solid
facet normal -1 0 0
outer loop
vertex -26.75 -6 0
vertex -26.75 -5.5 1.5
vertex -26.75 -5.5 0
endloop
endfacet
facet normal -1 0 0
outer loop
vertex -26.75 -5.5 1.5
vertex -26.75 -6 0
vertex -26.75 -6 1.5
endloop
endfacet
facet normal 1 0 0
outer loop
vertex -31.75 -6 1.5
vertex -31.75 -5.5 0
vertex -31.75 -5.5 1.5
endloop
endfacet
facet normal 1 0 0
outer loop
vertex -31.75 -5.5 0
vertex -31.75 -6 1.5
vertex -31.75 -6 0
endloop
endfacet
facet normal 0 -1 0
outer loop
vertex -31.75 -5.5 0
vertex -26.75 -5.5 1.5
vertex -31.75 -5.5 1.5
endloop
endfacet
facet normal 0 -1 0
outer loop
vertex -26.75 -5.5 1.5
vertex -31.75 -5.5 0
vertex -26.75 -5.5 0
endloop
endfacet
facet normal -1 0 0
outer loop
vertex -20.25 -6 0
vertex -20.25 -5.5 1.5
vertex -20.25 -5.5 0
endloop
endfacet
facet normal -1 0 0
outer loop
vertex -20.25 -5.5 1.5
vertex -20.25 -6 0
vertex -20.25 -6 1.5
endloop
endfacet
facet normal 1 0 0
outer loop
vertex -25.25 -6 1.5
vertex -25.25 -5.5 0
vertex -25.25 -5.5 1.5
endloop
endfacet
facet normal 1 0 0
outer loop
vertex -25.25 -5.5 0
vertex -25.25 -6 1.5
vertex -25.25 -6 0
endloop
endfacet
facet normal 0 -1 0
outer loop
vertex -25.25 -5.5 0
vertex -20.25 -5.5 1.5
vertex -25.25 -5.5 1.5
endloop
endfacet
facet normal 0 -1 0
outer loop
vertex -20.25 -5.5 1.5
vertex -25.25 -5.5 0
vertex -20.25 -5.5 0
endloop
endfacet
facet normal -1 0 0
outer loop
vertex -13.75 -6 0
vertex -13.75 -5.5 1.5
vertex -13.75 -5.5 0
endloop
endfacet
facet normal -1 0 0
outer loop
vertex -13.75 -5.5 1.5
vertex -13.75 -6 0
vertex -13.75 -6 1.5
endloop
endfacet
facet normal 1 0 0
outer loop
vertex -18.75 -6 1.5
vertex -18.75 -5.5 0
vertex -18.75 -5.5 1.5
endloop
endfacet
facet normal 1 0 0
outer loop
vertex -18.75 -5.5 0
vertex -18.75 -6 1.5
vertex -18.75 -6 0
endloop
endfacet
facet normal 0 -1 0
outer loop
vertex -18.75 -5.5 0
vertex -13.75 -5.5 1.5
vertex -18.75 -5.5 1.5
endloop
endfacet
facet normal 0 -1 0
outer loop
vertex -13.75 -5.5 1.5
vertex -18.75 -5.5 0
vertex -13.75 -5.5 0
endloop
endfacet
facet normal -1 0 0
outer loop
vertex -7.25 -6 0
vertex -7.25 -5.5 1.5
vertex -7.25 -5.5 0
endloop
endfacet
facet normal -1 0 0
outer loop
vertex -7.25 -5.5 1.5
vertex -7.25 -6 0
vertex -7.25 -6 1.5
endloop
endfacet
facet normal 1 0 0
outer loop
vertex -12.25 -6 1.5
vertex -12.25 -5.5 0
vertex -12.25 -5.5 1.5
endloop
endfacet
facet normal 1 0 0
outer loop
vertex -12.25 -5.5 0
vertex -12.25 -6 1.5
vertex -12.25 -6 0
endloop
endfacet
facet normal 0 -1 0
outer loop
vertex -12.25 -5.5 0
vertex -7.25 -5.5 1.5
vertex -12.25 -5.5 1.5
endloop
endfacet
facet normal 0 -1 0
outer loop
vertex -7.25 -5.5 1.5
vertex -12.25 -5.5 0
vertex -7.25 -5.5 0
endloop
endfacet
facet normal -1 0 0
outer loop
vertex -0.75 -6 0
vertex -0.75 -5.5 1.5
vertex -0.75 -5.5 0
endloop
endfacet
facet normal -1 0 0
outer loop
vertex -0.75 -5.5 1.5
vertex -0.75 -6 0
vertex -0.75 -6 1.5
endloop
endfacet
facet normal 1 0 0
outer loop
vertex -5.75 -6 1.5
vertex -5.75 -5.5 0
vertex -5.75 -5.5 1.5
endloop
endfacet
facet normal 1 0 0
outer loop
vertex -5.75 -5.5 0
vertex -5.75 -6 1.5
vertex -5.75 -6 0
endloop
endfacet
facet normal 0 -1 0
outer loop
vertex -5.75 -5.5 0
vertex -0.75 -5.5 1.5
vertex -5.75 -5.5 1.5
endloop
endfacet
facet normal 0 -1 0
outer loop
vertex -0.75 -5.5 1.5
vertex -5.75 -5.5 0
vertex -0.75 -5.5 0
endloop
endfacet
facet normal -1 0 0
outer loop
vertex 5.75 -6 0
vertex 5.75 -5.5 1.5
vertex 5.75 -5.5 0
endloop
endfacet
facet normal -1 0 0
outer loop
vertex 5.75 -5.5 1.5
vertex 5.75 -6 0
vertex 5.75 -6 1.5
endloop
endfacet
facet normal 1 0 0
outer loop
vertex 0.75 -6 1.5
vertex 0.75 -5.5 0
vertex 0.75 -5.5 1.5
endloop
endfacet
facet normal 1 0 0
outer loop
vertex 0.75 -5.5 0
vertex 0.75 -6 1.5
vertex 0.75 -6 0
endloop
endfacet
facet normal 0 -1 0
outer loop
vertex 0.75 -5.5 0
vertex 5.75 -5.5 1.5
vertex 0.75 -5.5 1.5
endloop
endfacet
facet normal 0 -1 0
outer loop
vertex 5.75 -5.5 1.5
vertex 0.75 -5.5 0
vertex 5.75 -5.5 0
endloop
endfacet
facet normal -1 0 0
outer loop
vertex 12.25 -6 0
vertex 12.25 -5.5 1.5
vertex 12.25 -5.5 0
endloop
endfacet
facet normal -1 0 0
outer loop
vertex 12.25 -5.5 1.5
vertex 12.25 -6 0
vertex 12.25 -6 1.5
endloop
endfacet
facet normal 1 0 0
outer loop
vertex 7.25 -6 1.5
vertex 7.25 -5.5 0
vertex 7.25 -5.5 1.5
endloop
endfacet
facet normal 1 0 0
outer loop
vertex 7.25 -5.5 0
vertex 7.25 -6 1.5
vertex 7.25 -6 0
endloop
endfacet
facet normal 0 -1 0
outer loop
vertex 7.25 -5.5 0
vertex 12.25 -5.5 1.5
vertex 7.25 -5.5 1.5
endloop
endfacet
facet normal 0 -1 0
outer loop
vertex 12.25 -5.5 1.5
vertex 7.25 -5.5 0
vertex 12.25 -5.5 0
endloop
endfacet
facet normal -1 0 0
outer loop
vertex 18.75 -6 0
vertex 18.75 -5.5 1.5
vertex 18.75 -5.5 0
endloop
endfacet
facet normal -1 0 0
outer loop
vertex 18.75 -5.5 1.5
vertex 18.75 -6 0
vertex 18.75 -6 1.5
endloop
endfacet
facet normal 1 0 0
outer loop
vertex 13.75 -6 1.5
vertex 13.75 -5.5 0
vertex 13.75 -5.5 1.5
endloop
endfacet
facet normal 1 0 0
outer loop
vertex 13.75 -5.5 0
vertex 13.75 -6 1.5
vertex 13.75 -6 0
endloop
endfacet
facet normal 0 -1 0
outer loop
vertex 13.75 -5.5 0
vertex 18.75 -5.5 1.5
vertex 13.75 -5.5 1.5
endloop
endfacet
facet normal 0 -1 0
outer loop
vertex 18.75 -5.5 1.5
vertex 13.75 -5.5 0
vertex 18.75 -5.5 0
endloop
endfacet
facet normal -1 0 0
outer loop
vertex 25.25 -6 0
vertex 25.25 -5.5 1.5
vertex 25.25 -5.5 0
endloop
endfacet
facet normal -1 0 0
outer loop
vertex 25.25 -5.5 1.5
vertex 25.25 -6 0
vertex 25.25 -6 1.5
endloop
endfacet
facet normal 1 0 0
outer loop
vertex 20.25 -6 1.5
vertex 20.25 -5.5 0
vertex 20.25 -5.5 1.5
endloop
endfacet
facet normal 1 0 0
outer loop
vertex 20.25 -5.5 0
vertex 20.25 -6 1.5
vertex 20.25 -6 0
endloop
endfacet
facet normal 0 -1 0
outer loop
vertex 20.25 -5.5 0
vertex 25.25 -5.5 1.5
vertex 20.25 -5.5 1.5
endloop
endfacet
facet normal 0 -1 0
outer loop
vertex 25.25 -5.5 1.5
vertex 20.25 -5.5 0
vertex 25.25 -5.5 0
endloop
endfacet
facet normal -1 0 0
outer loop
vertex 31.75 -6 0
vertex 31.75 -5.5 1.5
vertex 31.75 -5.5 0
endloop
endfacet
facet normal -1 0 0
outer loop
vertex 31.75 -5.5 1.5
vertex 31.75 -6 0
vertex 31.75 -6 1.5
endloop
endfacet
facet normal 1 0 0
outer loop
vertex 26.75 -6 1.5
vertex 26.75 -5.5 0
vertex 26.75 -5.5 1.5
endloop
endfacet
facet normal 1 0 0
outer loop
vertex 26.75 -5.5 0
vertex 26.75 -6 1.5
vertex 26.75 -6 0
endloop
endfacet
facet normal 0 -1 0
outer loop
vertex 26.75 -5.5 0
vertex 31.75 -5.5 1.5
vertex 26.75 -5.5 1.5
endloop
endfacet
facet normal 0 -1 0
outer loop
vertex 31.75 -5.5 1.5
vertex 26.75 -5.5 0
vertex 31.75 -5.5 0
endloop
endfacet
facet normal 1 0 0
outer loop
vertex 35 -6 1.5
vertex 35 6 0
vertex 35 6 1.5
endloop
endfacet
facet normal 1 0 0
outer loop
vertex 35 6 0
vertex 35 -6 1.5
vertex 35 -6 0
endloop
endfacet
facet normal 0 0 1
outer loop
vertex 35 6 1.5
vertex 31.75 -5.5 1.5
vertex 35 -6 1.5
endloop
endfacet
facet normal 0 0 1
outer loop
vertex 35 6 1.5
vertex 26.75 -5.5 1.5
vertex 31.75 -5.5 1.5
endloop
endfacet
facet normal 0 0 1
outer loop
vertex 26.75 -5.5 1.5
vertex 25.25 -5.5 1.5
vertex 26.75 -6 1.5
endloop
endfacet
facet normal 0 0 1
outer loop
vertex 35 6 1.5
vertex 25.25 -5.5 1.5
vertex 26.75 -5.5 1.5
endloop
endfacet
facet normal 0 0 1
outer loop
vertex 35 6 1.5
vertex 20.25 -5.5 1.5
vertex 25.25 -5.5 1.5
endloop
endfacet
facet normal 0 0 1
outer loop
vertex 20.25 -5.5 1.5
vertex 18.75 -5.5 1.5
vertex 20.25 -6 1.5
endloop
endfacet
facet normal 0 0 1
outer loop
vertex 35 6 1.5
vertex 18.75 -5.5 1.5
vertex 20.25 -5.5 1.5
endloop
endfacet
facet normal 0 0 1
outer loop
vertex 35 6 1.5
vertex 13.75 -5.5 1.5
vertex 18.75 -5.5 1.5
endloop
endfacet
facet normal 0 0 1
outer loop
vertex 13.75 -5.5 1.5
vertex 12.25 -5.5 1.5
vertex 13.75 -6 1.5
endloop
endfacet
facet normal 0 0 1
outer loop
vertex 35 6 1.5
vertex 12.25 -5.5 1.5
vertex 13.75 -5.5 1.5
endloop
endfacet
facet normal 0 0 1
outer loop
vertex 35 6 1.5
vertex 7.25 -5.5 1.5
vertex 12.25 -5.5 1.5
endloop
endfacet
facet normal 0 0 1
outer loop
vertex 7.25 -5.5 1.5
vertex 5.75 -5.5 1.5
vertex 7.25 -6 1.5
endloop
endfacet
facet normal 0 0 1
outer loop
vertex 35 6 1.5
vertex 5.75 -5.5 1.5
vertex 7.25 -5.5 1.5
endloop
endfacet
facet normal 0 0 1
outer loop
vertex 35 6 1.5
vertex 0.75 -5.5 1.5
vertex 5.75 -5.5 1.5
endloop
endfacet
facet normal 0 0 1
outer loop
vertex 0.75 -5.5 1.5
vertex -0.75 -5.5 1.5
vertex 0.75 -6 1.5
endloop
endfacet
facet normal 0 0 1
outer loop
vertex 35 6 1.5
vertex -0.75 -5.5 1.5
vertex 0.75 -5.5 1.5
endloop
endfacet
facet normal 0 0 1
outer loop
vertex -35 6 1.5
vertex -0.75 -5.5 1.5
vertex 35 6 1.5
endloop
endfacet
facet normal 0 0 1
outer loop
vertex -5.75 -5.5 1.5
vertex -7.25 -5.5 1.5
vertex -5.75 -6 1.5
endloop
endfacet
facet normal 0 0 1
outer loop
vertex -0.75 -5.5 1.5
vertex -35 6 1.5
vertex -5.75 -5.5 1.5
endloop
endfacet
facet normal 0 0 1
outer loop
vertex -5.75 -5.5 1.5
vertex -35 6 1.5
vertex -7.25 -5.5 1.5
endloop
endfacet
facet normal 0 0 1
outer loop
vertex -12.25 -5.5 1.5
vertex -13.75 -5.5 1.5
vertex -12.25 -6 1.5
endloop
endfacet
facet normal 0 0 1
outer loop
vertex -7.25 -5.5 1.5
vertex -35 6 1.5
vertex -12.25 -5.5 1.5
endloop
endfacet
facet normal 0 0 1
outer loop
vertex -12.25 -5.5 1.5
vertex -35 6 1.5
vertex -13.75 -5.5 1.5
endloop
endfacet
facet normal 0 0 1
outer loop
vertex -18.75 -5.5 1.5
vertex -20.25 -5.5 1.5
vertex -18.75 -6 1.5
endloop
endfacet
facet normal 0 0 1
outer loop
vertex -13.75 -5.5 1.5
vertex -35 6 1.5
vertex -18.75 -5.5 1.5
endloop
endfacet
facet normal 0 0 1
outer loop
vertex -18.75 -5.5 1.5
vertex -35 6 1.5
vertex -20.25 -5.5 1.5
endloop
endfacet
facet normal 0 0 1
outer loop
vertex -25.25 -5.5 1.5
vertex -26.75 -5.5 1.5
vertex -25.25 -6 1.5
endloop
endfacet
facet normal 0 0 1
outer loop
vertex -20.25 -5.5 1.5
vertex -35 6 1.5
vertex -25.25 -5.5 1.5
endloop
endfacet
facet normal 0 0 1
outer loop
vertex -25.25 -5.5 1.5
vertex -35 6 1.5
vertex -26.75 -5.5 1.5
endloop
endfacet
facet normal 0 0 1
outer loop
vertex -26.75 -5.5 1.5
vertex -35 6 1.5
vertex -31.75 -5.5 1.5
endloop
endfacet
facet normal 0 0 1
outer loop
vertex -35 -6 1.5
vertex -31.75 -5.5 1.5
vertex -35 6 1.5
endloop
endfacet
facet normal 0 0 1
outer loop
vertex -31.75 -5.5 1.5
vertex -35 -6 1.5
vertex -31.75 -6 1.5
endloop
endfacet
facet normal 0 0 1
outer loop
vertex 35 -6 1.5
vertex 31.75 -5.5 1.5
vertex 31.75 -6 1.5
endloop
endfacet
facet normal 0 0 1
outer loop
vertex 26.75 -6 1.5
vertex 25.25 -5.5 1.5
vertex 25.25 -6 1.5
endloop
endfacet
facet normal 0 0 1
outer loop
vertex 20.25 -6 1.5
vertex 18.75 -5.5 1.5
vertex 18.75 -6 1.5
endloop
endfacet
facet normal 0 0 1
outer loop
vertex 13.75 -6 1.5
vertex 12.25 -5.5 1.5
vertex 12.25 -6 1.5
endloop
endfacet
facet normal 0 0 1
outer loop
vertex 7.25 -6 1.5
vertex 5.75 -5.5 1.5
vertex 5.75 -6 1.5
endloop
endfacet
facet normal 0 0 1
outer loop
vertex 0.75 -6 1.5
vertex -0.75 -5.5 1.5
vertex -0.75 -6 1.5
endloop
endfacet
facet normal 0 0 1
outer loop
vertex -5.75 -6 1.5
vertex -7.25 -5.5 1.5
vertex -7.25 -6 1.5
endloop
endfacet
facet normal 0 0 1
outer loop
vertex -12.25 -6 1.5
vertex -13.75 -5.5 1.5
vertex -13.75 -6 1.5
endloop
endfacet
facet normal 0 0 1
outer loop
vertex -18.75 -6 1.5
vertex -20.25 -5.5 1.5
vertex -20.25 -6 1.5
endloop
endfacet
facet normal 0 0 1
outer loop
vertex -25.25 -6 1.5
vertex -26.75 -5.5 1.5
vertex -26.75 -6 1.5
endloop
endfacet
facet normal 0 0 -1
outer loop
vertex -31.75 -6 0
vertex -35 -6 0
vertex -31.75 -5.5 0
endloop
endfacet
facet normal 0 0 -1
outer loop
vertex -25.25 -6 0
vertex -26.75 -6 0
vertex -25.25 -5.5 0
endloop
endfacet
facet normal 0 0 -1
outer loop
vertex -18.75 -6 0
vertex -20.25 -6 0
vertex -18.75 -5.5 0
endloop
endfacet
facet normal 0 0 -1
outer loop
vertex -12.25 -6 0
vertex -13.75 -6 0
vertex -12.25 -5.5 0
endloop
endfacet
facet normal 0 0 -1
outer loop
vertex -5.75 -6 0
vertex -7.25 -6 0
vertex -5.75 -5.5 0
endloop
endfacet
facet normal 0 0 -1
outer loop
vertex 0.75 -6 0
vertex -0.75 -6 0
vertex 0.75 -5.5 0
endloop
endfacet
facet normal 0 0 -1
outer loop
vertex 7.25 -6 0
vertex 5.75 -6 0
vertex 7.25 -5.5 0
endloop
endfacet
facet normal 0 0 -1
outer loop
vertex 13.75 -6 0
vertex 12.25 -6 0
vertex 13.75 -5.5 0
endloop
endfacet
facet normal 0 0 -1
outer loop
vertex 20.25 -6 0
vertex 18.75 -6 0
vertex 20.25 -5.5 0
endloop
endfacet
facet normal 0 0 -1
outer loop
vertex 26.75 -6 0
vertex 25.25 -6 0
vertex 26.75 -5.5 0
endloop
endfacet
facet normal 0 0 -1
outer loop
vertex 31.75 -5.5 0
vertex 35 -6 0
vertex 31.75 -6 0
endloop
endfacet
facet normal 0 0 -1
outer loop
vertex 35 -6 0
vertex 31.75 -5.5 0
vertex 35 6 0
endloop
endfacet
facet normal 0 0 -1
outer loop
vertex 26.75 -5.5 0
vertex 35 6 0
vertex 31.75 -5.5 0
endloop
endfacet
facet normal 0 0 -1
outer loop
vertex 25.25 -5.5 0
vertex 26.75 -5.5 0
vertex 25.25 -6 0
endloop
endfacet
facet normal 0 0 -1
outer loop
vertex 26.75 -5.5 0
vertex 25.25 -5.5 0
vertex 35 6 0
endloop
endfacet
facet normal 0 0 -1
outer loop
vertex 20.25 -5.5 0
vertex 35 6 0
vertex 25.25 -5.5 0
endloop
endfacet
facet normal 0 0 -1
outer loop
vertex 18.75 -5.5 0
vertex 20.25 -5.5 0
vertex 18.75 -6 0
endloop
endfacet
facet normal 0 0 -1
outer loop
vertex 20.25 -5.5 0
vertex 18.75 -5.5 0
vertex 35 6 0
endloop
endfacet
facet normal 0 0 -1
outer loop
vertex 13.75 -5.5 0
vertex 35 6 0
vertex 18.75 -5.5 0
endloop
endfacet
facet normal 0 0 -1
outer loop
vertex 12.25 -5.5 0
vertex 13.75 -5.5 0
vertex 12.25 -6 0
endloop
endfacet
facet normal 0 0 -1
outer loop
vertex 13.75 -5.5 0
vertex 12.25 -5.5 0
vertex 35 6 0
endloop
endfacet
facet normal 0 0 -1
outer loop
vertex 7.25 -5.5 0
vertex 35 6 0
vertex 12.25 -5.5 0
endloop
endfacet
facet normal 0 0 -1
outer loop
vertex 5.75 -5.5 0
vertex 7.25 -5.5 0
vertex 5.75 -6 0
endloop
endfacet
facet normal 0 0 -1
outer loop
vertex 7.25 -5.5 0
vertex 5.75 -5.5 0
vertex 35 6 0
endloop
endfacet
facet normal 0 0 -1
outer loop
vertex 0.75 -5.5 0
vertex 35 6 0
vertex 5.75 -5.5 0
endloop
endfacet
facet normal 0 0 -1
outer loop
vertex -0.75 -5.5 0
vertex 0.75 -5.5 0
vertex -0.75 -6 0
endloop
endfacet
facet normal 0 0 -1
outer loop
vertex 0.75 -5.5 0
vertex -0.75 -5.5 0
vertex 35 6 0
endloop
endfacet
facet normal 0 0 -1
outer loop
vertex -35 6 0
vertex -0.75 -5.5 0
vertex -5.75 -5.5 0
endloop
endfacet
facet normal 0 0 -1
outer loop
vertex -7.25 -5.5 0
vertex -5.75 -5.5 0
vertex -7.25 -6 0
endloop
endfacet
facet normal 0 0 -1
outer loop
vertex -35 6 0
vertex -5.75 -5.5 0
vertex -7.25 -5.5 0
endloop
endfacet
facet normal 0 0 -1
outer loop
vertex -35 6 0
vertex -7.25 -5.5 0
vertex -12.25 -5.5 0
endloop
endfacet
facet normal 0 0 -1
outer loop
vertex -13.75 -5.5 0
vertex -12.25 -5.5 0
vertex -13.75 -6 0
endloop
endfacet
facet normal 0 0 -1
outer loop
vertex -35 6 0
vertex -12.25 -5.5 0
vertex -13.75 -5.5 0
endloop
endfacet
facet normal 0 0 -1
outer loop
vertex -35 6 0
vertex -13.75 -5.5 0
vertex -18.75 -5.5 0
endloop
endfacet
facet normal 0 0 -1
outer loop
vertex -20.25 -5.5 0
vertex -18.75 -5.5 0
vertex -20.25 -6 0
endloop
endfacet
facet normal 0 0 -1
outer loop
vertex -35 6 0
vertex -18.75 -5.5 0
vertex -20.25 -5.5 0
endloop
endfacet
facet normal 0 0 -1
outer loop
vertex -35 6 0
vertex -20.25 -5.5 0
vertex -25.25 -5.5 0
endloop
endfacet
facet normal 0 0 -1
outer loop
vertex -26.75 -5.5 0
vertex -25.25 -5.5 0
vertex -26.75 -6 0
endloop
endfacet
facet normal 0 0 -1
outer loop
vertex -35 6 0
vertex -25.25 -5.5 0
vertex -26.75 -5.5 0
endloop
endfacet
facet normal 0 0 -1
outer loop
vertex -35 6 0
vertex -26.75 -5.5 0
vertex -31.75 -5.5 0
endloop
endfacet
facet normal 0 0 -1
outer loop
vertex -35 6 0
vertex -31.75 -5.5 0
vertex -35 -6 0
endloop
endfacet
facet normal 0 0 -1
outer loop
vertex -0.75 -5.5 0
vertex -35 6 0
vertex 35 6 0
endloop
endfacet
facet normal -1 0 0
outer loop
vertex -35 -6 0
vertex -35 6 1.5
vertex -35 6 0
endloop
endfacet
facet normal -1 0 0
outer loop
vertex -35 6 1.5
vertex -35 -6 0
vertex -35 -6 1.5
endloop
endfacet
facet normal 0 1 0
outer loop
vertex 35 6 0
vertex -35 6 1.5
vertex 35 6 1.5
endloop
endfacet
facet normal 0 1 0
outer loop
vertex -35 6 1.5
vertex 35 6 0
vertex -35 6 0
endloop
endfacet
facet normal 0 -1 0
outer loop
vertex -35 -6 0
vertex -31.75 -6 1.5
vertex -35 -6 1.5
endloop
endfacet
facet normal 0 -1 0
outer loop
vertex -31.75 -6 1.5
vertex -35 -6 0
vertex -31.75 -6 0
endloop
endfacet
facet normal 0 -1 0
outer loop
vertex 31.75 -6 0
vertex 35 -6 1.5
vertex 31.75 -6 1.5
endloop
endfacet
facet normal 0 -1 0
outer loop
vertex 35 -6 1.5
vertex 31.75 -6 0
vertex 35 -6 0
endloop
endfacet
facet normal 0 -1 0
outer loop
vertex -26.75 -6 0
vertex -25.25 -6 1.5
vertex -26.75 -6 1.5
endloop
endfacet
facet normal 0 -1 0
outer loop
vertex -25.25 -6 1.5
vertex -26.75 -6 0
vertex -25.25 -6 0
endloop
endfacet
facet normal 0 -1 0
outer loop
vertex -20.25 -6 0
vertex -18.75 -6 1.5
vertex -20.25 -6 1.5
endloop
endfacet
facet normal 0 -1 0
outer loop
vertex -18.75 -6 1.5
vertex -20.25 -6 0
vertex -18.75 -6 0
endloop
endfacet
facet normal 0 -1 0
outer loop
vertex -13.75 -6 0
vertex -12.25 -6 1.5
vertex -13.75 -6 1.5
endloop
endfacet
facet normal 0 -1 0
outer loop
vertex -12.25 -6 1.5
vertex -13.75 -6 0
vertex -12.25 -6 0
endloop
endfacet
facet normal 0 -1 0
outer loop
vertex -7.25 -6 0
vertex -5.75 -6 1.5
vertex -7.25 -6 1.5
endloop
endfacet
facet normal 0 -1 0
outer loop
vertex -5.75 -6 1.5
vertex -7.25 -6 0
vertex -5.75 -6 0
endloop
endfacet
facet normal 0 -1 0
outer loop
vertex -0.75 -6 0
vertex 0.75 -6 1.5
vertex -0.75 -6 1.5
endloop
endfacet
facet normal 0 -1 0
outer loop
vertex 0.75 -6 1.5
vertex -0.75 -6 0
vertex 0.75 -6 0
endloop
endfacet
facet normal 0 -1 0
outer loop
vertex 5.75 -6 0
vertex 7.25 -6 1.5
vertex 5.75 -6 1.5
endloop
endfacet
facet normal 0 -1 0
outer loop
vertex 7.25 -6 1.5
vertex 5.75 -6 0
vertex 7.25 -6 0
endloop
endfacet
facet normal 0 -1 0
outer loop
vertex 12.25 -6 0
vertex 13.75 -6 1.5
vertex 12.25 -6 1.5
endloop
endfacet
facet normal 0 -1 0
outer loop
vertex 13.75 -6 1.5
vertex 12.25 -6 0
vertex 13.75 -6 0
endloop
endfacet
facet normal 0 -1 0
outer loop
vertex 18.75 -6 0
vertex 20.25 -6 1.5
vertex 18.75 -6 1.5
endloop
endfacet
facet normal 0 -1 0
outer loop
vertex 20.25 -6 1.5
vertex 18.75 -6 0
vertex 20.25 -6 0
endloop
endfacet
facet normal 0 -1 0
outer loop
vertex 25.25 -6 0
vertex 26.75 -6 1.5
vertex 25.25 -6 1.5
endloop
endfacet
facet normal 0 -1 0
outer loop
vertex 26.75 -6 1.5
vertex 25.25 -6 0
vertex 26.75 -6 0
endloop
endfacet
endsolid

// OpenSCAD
// 10-well agarose gel comb, printed lying flat
// Units: mm

plate_t      = 1.5;   // plate thickness (Z)
spine_l      = 70;    // spine length (X)
spine_w      = 12;    // spine width (Y)
teeth_n      = 10;    // number of teeth
teeth_w      = 5;     // tooth width (X)
teeth_l      = 12;    // tooth length (Y)
teeth_gap    = 1.5;   // gap between teeth (X)
overcut      = 0.5;   // cutter overshoot past faces

$fn = 64;

pitch = teeth_w + teeth_gap;  // centre-to-centre spacing

difference() {
    // Base plate with spine
    translate([-spine_l/2, -spine_w/2, 0])
        cube([spine_l, spine_w, plate_t]);

    // Teeth hanging in -Y from one long edge
    for (i = [0 : teeth_n - 1]) {
        x = (i - (teeth_n - 1)/2) * pitch;
        translate([x - teeth_w/2, -spine_w/2 - teeth_l, -overcut])
            cube([teeth_w, teeth_l + overcut, plate_t + 2*overcut]);
    }
}
